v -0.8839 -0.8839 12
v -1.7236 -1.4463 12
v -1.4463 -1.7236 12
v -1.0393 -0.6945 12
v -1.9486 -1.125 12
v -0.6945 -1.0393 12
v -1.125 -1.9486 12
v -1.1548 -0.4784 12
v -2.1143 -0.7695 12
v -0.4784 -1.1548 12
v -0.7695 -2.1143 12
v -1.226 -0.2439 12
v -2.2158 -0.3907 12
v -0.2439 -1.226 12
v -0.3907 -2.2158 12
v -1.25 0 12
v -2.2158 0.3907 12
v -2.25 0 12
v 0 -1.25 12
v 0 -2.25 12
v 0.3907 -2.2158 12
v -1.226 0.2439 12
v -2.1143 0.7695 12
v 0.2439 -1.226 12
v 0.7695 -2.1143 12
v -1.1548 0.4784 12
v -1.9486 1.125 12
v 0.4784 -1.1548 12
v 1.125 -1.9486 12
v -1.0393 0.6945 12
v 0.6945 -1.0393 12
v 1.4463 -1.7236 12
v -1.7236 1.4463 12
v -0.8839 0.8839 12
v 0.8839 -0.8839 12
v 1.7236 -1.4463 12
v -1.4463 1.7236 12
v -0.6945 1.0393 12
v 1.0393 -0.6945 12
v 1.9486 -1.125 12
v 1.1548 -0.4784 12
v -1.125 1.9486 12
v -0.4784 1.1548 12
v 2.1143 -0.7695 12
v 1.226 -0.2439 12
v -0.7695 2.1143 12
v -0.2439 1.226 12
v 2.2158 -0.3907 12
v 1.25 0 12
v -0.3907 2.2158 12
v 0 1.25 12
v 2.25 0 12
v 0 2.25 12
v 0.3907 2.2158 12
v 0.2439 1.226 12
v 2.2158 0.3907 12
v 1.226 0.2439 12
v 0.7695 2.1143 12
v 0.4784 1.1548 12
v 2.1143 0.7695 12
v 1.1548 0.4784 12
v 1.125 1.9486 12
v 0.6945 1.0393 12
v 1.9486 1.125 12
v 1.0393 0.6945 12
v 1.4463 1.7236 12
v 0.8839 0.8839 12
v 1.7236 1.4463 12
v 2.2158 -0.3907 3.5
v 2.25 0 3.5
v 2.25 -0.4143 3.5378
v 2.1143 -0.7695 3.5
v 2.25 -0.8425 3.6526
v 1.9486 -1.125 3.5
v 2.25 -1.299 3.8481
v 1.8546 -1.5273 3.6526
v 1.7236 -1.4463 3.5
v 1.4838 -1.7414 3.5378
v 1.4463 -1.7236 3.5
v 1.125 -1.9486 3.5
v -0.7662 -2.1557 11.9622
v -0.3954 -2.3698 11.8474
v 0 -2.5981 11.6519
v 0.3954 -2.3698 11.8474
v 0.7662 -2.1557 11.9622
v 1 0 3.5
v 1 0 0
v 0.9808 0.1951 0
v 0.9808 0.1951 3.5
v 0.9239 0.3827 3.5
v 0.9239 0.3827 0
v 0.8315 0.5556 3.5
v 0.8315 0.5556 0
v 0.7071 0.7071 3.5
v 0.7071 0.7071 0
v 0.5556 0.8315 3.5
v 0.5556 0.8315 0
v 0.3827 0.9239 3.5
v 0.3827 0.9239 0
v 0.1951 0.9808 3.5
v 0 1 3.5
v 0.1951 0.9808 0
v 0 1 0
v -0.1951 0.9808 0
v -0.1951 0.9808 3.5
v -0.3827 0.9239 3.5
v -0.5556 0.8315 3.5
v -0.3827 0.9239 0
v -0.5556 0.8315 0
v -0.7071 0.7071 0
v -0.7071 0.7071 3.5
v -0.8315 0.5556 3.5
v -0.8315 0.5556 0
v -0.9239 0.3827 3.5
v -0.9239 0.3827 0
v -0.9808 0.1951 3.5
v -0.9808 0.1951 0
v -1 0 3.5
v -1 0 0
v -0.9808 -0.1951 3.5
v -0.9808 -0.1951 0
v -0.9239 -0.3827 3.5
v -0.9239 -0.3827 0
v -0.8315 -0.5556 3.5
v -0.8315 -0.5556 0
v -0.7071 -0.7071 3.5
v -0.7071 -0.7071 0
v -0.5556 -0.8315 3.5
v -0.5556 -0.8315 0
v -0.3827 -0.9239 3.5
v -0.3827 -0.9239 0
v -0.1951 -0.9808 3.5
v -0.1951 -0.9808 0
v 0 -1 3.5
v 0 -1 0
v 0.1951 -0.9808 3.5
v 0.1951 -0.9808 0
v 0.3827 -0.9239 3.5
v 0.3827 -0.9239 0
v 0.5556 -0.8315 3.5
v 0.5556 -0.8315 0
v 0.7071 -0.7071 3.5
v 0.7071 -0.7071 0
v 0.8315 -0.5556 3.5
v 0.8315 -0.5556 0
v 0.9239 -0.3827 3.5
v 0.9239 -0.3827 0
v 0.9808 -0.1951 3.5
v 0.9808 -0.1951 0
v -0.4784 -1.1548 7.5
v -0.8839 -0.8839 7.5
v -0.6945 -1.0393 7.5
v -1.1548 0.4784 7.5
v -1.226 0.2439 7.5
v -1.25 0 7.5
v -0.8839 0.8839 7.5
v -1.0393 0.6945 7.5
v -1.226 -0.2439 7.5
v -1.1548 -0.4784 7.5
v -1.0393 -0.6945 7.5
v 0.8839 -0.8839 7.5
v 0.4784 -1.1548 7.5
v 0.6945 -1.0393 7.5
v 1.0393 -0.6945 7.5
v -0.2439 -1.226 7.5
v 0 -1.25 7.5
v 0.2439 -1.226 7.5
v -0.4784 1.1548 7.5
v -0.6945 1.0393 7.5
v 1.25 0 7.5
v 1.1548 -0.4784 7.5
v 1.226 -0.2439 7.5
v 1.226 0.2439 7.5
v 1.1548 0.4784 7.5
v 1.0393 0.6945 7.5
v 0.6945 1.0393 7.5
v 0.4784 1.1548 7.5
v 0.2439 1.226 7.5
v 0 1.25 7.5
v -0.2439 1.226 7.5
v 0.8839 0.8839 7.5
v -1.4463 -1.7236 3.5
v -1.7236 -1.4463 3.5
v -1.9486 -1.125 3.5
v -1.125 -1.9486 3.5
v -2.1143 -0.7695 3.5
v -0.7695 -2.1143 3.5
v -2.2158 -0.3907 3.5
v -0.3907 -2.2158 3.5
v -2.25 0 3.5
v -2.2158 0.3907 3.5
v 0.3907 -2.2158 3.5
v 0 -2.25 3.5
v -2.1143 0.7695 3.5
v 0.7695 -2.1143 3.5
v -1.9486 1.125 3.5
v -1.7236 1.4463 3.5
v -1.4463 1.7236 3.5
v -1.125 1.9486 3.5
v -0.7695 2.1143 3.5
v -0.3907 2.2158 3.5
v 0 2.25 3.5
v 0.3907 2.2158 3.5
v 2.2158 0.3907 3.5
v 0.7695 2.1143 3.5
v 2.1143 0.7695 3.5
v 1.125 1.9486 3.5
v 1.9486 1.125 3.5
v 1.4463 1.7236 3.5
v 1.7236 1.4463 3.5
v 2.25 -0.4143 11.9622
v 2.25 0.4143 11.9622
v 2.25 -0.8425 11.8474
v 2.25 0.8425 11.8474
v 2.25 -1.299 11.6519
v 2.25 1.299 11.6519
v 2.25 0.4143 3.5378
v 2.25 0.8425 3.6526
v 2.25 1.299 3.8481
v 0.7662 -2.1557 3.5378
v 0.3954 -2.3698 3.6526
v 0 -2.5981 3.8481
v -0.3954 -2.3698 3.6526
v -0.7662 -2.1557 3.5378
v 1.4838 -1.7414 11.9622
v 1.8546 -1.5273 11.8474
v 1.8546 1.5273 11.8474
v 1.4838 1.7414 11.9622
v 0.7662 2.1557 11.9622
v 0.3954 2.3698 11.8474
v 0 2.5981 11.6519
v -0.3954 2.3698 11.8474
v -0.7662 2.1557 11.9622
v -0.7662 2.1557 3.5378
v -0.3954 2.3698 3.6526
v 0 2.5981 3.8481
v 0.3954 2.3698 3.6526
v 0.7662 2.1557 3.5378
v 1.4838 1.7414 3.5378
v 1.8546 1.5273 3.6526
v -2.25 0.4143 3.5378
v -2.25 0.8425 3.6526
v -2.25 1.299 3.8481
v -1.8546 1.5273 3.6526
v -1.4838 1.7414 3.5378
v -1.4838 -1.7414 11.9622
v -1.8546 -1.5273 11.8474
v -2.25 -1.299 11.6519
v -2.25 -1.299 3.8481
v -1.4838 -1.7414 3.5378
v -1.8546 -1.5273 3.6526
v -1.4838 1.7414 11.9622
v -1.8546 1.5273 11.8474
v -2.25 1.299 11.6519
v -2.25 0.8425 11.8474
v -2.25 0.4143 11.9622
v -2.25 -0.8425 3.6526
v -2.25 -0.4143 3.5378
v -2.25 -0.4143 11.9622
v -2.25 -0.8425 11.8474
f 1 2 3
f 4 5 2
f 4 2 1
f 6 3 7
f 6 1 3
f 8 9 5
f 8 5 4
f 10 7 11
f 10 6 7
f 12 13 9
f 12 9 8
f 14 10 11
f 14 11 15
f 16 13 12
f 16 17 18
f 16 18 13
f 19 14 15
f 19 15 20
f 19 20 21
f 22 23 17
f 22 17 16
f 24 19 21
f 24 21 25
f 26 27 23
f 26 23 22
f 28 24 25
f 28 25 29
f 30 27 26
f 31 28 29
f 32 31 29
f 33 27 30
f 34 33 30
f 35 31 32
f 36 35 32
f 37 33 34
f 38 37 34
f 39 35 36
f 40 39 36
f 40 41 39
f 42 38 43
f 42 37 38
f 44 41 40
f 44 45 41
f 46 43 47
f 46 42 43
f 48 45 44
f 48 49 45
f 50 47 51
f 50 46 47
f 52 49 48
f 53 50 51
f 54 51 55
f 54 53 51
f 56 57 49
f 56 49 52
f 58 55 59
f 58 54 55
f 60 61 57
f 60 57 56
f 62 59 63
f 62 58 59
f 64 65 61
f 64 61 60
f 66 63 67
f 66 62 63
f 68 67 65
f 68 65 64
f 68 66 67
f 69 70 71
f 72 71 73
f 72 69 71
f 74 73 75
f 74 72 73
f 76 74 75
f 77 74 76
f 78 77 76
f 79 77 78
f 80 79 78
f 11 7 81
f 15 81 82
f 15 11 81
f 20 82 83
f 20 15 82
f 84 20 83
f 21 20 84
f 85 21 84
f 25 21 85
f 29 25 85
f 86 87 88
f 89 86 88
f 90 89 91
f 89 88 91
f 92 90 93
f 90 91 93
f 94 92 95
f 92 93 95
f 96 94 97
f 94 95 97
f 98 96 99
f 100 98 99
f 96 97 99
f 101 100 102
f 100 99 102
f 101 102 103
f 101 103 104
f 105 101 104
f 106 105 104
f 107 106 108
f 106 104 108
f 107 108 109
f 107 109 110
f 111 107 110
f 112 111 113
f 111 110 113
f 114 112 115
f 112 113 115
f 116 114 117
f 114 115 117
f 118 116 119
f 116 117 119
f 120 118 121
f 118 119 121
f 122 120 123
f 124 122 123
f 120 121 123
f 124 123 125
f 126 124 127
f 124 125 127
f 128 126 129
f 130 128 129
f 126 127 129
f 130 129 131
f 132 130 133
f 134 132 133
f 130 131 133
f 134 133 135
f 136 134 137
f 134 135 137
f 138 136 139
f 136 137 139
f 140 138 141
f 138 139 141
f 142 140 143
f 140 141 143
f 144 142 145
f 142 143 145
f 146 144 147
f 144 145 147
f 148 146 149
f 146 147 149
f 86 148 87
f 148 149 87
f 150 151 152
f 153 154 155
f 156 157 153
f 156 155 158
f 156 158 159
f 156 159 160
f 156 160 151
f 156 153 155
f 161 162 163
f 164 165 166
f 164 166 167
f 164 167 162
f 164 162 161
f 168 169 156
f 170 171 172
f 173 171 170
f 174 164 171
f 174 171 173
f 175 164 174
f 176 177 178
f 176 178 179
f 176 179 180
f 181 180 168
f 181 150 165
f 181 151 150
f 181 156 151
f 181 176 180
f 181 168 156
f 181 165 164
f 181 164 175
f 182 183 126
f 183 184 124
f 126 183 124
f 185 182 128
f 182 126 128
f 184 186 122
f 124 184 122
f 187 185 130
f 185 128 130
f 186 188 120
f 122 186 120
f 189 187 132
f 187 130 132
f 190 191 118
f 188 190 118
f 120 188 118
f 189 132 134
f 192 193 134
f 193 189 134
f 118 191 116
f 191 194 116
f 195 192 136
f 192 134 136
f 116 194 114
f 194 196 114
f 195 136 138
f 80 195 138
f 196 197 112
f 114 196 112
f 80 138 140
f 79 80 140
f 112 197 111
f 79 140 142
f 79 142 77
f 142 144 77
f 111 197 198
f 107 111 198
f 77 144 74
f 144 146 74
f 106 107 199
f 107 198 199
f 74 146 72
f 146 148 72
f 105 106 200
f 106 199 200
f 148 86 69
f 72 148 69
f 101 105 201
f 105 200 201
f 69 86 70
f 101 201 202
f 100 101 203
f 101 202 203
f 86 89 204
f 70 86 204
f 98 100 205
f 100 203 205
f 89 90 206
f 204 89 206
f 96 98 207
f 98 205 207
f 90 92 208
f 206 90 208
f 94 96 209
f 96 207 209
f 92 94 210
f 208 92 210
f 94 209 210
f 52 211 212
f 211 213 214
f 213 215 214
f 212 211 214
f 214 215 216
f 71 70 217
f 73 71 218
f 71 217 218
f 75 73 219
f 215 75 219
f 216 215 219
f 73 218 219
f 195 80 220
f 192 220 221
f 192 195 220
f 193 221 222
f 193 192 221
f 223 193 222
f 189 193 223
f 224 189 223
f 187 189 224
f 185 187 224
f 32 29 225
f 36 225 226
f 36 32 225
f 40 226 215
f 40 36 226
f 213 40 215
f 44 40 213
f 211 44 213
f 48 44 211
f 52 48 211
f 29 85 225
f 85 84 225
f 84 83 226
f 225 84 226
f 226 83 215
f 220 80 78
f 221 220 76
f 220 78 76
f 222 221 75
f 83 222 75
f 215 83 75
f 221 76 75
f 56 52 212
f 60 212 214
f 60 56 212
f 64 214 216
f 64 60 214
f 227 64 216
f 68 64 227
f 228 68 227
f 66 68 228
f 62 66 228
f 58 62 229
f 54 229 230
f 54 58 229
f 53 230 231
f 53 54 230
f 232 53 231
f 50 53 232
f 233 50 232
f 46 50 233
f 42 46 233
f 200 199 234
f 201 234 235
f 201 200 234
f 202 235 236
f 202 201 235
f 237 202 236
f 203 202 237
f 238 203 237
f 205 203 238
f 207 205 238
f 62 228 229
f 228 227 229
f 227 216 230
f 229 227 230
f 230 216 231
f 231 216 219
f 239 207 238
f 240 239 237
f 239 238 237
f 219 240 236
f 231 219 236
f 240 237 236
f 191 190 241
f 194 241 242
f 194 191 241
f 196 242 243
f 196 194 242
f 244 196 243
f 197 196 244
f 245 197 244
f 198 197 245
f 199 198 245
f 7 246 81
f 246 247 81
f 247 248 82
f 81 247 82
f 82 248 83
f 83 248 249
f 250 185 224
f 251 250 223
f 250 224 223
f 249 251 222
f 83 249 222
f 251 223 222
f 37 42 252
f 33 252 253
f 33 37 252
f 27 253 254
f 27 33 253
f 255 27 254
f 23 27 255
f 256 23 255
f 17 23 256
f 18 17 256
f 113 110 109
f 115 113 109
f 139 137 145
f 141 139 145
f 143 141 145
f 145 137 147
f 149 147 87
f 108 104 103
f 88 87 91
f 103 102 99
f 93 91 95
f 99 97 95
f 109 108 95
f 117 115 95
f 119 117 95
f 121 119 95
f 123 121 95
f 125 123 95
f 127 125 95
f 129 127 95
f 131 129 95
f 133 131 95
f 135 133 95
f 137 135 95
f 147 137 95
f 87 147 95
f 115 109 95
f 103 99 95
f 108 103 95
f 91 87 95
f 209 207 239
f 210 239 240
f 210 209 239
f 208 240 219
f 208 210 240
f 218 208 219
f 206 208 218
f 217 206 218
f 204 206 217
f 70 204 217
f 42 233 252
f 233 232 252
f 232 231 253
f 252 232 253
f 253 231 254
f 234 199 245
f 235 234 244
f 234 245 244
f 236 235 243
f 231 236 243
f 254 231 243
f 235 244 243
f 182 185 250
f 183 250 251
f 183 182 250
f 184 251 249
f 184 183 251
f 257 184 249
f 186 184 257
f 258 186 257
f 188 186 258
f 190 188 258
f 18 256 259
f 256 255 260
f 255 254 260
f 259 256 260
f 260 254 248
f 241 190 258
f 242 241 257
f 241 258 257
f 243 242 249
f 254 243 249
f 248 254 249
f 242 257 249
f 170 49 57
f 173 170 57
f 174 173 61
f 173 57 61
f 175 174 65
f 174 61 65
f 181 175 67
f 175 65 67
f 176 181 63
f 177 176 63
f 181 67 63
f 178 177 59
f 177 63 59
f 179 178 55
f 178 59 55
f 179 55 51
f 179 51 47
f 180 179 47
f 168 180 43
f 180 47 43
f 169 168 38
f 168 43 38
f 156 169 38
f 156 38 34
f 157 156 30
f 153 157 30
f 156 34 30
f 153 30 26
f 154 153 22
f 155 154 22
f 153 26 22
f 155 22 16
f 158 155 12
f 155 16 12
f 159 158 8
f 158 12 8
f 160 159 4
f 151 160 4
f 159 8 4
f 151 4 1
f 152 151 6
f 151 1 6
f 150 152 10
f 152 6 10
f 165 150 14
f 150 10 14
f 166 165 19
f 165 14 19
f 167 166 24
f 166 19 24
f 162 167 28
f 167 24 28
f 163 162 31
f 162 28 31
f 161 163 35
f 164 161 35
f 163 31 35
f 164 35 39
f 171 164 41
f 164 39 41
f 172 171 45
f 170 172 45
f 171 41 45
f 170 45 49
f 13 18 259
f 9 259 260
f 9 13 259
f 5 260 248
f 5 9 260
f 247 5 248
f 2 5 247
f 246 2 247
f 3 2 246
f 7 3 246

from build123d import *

# Parameters (mm, degrees)
SKETCH1_R           = 1
BOSS_EXTRUDE1_DEPTH = 3.5
BOSS_EXTRUDE2_DEPTH = 8.5
SKETCH3_R           = 1.25
CUT_EXTRUDE1_DEPTH  = 4.5
SKETCH4_OUTSIDE_W   = 36.23
SKETCH4_OUTSIDE_H   = 36.926
SKETCH4_OUTSIDE_R   = 2.25
CUT_EXTRUDE2_DEPTH  = 13.482487733
CUT_EXTRUDE2_DRAFT  = -45
SKETCH6_OUTSIDE_W   = 29.602
SKETCH6_OUTSIDE_H   = 30.298
SKETCH6_OUTSIDE_R   = 2.25
CUT_EXTRUDE3_DEPTH  = 10.16856041
CUT_EXTRUDE3_DRAFT  = -45


with BuildPart() as part:
    # Sketch1 → Boss-Extrude1 (new body)
    with BuildSketch(Plane.XY):
        Circle(SKETCH1_R)
    extrude(amount=BOSS_EXTRUDE1_DEPTH)

    # Sketch2 → Boss-Extrude2 (add)
    with BuildSketch(Plane.XY.offset(3.5)):
        Polygon((0, 2.598076211), (-2.25, 1.299038106), (-2.25, -1.299038106), (0, -2.598076211), (2.25, -1.299038106), (2.25, 1.299038106), align=None)
    extrude(amount=BOSS_EXTRUDE2_DEPTH)

    # Sketch3 → Cut-Extrude1 (cut)
    with BuildSketch(Plane.XY.offset(12)):
        Circle(SKETCH3_R)
    extrude(amount=-CUT_EXTRUDE1_DEPTH, mode=Mode.SUBTRACT)


with BuildPart() as cut_extrude2_tool:
    # Sketch4 outside → Cut-Extrude2 (with draft: the straight prism first)
    with BuildSketch(Plane.XY.offset(12)):
        Rectangle(SKETCH4_OUTSIDE_W, SKETCH4_OUTSIDE_H)
        Circle(SKETCH4_OUTSIDE_R, mode=Mode.SUBTRACT)
    extrude(amount=-CUT_EXTRUDE2_DEPTH)
    # Cut-Extrude2: the draft: its side faces are tilted about the plane it starts from
    cut_extrude2_sides = [cut_extrude2_tool.faces().sort_by_distance(p)[0] for p in [
        (0, -18.463, 5.258756134),
        (18.115, 0, 5.258756134),
        (0, 18.463, 5.258756134),
        (-18.115, 0, 5.258756134),
        (-2.25, 0, 5.258756134),
    ]]
    draft(cut_extrude2_sides, Plane.XY.offset(12), CUT_EXTRUDE2_DRAFT)


with BuildPart() as part_1:
    add(part.part)

    # Cut-Extrude2: cut by cut_extrude2_tool
    add(cut_extrude2_tool.part, mode=Mode.SUBTRACT)


with BuildPart() as cut_extrude3_tool:
    # Sketch6 outside → Cut-Extrude3 (with draft: the straight prism first)
    with BuildSketch(Plane(origin=(0, 0, 3.5), x_dir=(-1, 0, 0), z_dir=(0, 0, -1))):
        Rectangle(SKETCH6_OUTSIDE_W, SKETCH6_OUTSIDE_H)
        Circle(SKETCH6_OUTSIDE_R, mode=Mode.SUBTRACT)
    extrude(amount=-CUT_EXTRUDE3_DEPTH)
    # Cut-Extrude3: the draft: its side faces are tilted about the plane it starts from
    cut_extrude3_sides = [cut_extrude3_tool.faces().sort_by_distance(p)[0] for p in [
        (0, -15.149, 8.584280205),
        (-14.801, 0, 8.584280205),
        (0, 15.149, 8.584280205),
        (14.801, 0, 8.584280205),
        (2.25, 0, 8.584280205),
    ]]
    draft(cut_extrude3_sides, Plane(origin=(0, 0, 3.5), x_dir=(-1, 0, 0), z_dir=(0, 0, -1)), CUT_EXTRUDE3_DRAFT)


with BuildPart() as part_2:
    add(part_1.part)

    # Cut-Extrude3: cut by cut_extrude3_tool
    add(cut_extrude3_tool.part, mode=Mode.SUBTRACT)


solid = part_2.part
